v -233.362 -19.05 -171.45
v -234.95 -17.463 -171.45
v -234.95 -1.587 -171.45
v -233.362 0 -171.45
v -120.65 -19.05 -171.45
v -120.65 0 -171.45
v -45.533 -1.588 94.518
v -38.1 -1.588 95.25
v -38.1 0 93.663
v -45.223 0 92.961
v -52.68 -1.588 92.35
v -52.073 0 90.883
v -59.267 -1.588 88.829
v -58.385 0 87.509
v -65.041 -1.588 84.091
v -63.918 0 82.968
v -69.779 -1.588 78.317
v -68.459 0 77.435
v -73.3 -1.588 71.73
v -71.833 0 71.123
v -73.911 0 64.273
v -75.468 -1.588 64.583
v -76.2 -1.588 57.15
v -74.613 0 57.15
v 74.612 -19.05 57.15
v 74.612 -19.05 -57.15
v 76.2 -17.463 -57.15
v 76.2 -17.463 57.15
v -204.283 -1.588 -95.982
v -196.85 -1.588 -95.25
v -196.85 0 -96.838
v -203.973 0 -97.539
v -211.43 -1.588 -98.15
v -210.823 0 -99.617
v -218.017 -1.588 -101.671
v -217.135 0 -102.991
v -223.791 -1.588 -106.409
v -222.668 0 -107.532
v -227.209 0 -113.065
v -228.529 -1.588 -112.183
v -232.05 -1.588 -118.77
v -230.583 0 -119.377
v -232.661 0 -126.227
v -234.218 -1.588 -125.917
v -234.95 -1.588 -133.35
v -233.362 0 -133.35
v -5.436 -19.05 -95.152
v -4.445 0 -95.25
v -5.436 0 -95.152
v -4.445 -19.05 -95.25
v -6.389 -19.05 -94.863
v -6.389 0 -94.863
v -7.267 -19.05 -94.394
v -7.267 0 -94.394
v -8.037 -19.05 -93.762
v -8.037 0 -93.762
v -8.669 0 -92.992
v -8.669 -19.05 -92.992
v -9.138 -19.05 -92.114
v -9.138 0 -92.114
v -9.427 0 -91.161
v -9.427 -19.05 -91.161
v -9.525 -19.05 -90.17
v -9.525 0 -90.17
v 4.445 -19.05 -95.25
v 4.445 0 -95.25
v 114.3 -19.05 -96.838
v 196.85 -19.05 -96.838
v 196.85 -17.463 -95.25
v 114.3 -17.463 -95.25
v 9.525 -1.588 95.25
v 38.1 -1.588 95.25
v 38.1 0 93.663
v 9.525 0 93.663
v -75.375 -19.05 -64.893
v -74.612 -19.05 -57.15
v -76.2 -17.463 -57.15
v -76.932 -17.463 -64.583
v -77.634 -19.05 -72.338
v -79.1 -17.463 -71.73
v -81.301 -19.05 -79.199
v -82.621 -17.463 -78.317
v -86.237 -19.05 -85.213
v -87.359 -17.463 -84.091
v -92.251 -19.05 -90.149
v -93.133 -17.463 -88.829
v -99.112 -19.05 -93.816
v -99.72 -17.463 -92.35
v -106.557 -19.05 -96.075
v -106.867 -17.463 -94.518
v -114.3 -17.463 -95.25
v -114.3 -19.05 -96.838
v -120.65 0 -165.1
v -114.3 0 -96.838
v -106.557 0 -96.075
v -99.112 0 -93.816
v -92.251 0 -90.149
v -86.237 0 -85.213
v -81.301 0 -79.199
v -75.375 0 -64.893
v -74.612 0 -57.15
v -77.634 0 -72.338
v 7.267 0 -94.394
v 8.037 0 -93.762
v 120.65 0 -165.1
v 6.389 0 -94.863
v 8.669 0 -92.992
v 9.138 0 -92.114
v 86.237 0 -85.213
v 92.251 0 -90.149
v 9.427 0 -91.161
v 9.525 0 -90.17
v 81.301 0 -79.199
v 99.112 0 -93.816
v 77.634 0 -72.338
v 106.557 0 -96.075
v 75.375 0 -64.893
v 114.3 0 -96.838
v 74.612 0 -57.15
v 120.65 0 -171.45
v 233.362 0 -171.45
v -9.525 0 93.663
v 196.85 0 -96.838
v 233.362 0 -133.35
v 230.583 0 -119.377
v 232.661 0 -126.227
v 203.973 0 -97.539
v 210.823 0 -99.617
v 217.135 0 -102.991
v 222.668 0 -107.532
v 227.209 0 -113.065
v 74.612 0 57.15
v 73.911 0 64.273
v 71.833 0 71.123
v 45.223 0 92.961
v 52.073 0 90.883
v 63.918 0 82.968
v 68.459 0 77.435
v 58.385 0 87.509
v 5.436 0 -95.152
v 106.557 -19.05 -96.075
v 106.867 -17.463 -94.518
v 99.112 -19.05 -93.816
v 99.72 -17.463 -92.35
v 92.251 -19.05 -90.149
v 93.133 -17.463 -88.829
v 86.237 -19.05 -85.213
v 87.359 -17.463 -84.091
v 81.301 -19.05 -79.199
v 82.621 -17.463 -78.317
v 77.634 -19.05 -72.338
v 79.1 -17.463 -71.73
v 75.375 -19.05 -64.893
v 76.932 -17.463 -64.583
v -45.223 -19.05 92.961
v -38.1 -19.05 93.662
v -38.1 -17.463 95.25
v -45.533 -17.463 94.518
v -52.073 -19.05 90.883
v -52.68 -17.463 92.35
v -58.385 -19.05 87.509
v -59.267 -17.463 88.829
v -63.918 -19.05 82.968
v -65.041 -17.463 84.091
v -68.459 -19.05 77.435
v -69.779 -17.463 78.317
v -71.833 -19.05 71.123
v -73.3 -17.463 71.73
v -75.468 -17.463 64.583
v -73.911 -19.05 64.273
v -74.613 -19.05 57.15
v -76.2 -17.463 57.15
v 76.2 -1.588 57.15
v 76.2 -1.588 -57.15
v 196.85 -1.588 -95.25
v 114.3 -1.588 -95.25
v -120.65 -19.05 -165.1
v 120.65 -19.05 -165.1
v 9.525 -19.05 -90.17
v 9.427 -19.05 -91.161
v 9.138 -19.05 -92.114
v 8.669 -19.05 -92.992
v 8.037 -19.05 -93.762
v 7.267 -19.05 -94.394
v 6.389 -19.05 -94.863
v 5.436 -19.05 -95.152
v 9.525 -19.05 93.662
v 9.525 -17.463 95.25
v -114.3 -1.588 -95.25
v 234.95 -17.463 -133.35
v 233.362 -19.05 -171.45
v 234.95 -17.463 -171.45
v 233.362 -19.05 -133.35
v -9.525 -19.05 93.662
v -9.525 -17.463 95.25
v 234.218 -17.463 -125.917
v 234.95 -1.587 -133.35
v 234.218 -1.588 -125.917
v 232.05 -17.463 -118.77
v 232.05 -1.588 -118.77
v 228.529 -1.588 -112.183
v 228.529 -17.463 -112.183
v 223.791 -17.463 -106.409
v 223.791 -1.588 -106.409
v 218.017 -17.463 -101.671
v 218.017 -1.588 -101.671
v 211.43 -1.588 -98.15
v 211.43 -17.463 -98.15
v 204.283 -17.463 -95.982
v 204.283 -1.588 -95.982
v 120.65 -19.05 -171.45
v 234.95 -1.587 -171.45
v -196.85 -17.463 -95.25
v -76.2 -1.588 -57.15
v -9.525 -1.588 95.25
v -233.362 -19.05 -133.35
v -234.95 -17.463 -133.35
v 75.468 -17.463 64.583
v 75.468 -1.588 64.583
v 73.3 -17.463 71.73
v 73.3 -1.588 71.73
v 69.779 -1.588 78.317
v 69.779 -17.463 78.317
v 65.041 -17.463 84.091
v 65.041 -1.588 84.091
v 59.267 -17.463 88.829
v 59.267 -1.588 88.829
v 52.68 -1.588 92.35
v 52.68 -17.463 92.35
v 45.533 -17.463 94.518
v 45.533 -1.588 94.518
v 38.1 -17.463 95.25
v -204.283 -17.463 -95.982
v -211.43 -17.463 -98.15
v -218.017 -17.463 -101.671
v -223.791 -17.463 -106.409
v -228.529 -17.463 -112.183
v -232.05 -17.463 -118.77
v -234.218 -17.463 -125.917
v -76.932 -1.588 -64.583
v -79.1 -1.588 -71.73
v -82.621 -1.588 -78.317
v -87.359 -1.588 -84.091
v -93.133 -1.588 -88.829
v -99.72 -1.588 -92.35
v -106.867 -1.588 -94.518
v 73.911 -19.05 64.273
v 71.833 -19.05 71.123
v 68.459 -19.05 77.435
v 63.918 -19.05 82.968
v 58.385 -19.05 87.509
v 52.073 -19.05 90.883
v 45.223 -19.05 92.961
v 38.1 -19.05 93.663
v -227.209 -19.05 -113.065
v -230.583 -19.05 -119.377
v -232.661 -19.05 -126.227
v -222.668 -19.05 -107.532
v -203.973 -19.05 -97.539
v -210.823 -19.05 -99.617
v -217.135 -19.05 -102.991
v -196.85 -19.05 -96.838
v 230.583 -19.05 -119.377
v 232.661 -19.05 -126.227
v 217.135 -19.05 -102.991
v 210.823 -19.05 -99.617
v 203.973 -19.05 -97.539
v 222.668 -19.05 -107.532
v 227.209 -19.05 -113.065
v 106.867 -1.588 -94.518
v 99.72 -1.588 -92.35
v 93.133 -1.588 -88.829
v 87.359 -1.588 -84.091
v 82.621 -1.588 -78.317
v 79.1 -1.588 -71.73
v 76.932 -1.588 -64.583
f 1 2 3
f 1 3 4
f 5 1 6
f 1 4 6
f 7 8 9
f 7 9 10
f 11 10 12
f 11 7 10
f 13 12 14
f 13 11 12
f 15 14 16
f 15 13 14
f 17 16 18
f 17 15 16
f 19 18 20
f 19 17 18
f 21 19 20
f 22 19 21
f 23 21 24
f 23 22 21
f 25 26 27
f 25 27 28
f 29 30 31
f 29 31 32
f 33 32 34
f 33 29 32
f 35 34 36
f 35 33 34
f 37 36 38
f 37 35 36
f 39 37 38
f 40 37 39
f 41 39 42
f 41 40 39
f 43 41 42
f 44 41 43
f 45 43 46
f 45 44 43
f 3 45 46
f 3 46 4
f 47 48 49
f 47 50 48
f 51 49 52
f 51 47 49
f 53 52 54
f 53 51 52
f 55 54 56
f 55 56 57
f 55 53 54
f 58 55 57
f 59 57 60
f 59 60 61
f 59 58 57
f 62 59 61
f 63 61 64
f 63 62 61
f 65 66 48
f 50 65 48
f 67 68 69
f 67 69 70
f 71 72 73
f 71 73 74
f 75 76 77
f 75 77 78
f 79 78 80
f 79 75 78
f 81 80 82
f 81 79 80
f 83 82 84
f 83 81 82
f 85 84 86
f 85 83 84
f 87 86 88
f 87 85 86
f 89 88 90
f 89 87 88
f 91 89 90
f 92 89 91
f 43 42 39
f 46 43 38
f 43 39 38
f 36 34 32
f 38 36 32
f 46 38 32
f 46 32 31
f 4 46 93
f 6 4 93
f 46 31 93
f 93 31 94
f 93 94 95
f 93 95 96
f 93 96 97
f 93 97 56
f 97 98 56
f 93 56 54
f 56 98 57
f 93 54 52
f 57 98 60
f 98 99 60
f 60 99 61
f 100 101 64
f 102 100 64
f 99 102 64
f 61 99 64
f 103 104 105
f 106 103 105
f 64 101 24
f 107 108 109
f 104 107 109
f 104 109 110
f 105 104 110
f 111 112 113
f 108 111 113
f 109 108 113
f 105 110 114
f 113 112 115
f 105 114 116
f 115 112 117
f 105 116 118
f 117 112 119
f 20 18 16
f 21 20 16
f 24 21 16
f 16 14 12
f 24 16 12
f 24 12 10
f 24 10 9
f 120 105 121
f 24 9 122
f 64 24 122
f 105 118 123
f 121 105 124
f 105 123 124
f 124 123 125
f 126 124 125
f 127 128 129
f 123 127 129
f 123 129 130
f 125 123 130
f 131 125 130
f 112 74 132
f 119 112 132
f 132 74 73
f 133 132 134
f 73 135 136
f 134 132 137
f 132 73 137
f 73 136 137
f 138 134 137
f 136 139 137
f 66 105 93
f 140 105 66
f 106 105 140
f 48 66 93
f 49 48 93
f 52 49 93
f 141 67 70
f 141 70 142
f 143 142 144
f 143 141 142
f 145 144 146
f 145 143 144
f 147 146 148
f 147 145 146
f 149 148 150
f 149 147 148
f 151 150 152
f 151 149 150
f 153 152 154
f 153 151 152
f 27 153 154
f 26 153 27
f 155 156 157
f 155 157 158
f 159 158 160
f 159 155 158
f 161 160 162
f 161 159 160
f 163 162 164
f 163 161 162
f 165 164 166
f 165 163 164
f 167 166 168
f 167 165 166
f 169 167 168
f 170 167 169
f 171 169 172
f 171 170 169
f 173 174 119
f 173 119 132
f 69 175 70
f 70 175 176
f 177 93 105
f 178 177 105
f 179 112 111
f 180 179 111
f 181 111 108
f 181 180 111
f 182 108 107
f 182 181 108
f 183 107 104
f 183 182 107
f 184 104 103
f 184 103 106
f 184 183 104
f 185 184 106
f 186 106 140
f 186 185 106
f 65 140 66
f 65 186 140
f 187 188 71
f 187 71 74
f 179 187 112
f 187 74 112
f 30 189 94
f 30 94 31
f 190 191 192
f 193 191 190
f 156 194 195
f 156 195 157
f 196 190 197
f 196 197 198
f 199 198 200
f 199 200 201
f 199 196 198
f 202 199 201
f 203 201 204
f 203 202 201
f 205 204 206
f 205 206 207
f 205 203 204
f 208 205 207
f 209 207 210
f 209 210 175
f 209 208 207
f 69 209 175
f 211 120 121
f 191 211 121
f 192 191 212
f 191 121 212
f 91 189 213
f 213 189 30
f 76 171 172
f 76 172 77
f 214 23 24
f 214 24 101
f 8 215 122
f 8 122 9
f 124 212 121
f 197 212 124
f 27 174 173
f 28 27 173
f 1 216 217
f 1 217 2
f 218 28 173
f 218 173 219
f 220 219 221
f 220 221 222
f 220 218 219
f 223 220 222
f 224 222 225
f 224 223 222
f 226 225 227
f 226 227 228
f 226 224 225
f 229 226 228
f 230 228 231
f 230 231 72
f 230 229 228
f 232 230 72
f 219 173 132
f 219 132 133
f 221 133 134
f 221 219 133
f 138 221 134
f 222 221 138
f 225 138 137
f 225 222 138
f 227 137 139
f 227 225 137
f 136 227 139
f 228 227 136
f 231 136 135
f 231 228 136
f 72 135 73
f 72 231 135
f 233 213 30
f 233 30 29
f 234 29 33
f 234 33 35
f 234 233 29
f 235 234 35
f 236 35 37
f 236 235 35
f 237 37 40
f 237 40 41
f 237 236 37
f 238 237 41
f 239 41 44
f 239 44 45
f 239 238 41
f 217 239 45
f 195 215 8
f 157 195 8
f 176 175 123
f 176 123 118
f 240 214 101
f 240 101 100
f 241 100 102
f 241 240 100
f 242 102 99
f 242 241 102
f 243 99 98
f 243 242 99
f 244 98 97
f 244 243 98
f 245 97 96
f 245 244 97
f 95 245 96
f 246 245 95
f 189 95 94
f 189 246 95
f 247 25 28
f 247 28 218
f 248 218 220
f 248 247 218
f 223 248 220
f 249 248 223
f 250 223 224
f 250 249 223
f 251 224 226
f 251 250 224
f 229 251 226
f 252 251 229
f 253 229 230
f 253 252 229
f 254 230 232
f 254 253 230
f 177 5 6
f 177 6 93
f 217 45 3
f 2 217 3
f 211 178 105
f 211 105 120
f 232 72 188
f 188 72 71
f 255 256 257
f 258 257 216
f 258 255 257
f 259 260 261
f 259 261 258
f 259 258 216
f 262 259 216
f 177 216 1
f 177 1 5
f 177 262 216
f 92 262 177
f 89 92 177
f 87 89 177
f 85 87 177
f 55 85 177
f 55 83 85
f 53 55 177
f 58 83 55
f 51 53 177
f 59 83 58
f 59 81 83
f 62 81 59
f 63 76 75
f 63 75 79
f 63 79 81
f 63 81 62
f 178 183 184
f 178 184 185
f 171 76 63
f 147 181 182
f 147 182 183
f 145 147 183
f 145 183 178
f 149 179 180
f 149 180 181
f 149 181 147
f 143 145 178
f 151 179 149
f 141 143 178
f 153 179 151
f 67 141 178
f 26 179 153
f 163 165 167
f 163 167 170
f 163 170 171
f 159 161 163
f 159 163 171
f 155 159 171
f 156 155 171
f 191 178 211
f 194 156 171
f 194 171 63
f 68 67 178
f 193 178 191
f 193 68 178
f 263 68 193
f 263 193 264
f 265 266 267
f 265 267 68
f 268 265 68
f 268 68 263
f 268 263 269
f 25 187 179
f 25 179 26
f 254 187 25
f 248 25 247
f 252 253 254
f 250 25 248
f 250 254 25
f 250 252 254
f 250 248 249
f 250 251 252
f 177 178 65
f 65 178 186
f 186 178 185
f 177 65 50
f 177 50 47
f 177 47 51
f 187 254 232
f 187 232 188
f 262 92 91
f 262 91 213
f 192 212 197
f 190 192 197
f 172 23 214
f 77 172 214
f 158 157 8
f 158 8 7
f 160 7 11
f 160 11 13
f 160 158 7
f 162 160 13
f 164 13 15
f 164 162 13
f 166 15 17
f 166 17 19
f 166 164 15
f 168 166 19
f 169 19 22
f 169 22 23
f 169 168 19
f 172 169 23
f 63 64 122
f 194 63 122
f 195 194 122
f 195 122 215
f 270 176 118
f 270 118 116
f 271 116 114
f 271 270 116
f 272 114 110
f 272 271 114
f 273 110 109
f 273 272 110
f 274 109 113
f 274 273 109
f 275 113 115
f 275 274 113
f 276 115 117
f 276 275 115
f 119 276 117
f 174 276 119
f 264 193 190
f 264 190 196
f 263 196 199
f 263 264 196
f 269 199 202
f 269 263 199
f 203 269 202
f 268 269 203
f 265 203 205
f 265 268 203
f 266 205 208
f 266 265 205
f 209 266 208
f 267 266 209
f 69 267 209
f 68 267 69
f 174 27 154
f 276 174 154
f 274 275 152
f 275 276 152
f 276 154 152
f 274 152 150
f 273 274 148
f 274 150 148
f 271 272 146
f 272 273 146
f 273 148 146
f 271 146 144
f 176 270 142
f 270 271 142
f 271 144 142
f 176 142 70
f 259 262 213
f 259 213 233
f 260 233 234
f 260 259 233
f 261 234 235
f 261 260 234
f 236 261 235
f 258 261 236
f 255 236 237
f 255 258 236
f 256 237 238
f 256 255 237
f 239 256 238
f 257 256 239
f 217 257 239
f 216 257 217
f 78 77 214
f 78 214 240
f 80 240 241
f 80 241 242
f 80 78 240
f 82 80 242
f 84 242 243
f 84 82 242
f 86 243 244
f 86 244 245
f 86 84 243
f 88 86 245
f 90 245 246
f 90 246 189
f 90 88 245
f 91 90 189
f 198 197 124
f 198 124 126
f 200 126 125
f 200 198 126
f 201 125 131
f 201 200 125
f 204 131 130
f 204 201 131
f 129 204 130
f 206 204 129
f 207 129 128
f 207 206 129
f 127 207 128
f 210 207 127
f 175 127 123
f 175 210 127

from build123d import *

# Parameters (mm, degrees)
F1_DEPTH = 19.05
F2_R     = 38.1
F3_R     = 5.08
F4_SIZE  = 1.5875


with BuildPart() as f1:
    # F0 (on Front) → F1 (new body)
    with BuildSketch(Plane.XZ):
        Polygon((76.2, -95.25), (76.2, 95.25), (9.525, 95.25), (9.525, -95.25), (-9.525, -95.25), (-9.525, 95.25), (-76.2, 95.25), (-76.2, -95.25), (-234.95, -95.25), (-234.95, -171.45), (-120.65, -171.45), (-120.65, -165.1), (120.65, -165.1), (120.65, -171.45), (234.95, -171.45), (234.95, -95.25), align=None)
    extrude(amount=F1_DEPTH)

    # F2
    f2_edges = [f1.edges().sort_by_distance(p)[0] for p in [
        (-234.95, -9.525, -95.25),
        (-76.2, -9.525, -95.25),
        (76.2, -9.525, -95.25),
        (234.95, -9.525, -95.25),
        (76.2, -9.525, 95.25),
        (-76.2, -9.525, 95.25),
    ]]
    fillet(f2_edges, radius=F2_R)

    # F3
    f3_edges = [f1.edges().sort_by_distance(p)[0] for p in [
        (9.525, -9.525, -95.25),
        (-9.525, -9.525, -95.25),
    ]]
    fillet(f3_edges, radius=F3_R)

    # F4
    f4_edges = [f1.edges().sort_by_distance(p)[0] for p in [
        (-155.575, -19.05, -95.25),
        (155.575, -19.05, -95.25),
        (155.575, 0, -95.25),
        (-23.8125, 0, 95.25),
    ]]
    chamfer(f4_edges, length=F4_SIZE)


solid = f1.part
